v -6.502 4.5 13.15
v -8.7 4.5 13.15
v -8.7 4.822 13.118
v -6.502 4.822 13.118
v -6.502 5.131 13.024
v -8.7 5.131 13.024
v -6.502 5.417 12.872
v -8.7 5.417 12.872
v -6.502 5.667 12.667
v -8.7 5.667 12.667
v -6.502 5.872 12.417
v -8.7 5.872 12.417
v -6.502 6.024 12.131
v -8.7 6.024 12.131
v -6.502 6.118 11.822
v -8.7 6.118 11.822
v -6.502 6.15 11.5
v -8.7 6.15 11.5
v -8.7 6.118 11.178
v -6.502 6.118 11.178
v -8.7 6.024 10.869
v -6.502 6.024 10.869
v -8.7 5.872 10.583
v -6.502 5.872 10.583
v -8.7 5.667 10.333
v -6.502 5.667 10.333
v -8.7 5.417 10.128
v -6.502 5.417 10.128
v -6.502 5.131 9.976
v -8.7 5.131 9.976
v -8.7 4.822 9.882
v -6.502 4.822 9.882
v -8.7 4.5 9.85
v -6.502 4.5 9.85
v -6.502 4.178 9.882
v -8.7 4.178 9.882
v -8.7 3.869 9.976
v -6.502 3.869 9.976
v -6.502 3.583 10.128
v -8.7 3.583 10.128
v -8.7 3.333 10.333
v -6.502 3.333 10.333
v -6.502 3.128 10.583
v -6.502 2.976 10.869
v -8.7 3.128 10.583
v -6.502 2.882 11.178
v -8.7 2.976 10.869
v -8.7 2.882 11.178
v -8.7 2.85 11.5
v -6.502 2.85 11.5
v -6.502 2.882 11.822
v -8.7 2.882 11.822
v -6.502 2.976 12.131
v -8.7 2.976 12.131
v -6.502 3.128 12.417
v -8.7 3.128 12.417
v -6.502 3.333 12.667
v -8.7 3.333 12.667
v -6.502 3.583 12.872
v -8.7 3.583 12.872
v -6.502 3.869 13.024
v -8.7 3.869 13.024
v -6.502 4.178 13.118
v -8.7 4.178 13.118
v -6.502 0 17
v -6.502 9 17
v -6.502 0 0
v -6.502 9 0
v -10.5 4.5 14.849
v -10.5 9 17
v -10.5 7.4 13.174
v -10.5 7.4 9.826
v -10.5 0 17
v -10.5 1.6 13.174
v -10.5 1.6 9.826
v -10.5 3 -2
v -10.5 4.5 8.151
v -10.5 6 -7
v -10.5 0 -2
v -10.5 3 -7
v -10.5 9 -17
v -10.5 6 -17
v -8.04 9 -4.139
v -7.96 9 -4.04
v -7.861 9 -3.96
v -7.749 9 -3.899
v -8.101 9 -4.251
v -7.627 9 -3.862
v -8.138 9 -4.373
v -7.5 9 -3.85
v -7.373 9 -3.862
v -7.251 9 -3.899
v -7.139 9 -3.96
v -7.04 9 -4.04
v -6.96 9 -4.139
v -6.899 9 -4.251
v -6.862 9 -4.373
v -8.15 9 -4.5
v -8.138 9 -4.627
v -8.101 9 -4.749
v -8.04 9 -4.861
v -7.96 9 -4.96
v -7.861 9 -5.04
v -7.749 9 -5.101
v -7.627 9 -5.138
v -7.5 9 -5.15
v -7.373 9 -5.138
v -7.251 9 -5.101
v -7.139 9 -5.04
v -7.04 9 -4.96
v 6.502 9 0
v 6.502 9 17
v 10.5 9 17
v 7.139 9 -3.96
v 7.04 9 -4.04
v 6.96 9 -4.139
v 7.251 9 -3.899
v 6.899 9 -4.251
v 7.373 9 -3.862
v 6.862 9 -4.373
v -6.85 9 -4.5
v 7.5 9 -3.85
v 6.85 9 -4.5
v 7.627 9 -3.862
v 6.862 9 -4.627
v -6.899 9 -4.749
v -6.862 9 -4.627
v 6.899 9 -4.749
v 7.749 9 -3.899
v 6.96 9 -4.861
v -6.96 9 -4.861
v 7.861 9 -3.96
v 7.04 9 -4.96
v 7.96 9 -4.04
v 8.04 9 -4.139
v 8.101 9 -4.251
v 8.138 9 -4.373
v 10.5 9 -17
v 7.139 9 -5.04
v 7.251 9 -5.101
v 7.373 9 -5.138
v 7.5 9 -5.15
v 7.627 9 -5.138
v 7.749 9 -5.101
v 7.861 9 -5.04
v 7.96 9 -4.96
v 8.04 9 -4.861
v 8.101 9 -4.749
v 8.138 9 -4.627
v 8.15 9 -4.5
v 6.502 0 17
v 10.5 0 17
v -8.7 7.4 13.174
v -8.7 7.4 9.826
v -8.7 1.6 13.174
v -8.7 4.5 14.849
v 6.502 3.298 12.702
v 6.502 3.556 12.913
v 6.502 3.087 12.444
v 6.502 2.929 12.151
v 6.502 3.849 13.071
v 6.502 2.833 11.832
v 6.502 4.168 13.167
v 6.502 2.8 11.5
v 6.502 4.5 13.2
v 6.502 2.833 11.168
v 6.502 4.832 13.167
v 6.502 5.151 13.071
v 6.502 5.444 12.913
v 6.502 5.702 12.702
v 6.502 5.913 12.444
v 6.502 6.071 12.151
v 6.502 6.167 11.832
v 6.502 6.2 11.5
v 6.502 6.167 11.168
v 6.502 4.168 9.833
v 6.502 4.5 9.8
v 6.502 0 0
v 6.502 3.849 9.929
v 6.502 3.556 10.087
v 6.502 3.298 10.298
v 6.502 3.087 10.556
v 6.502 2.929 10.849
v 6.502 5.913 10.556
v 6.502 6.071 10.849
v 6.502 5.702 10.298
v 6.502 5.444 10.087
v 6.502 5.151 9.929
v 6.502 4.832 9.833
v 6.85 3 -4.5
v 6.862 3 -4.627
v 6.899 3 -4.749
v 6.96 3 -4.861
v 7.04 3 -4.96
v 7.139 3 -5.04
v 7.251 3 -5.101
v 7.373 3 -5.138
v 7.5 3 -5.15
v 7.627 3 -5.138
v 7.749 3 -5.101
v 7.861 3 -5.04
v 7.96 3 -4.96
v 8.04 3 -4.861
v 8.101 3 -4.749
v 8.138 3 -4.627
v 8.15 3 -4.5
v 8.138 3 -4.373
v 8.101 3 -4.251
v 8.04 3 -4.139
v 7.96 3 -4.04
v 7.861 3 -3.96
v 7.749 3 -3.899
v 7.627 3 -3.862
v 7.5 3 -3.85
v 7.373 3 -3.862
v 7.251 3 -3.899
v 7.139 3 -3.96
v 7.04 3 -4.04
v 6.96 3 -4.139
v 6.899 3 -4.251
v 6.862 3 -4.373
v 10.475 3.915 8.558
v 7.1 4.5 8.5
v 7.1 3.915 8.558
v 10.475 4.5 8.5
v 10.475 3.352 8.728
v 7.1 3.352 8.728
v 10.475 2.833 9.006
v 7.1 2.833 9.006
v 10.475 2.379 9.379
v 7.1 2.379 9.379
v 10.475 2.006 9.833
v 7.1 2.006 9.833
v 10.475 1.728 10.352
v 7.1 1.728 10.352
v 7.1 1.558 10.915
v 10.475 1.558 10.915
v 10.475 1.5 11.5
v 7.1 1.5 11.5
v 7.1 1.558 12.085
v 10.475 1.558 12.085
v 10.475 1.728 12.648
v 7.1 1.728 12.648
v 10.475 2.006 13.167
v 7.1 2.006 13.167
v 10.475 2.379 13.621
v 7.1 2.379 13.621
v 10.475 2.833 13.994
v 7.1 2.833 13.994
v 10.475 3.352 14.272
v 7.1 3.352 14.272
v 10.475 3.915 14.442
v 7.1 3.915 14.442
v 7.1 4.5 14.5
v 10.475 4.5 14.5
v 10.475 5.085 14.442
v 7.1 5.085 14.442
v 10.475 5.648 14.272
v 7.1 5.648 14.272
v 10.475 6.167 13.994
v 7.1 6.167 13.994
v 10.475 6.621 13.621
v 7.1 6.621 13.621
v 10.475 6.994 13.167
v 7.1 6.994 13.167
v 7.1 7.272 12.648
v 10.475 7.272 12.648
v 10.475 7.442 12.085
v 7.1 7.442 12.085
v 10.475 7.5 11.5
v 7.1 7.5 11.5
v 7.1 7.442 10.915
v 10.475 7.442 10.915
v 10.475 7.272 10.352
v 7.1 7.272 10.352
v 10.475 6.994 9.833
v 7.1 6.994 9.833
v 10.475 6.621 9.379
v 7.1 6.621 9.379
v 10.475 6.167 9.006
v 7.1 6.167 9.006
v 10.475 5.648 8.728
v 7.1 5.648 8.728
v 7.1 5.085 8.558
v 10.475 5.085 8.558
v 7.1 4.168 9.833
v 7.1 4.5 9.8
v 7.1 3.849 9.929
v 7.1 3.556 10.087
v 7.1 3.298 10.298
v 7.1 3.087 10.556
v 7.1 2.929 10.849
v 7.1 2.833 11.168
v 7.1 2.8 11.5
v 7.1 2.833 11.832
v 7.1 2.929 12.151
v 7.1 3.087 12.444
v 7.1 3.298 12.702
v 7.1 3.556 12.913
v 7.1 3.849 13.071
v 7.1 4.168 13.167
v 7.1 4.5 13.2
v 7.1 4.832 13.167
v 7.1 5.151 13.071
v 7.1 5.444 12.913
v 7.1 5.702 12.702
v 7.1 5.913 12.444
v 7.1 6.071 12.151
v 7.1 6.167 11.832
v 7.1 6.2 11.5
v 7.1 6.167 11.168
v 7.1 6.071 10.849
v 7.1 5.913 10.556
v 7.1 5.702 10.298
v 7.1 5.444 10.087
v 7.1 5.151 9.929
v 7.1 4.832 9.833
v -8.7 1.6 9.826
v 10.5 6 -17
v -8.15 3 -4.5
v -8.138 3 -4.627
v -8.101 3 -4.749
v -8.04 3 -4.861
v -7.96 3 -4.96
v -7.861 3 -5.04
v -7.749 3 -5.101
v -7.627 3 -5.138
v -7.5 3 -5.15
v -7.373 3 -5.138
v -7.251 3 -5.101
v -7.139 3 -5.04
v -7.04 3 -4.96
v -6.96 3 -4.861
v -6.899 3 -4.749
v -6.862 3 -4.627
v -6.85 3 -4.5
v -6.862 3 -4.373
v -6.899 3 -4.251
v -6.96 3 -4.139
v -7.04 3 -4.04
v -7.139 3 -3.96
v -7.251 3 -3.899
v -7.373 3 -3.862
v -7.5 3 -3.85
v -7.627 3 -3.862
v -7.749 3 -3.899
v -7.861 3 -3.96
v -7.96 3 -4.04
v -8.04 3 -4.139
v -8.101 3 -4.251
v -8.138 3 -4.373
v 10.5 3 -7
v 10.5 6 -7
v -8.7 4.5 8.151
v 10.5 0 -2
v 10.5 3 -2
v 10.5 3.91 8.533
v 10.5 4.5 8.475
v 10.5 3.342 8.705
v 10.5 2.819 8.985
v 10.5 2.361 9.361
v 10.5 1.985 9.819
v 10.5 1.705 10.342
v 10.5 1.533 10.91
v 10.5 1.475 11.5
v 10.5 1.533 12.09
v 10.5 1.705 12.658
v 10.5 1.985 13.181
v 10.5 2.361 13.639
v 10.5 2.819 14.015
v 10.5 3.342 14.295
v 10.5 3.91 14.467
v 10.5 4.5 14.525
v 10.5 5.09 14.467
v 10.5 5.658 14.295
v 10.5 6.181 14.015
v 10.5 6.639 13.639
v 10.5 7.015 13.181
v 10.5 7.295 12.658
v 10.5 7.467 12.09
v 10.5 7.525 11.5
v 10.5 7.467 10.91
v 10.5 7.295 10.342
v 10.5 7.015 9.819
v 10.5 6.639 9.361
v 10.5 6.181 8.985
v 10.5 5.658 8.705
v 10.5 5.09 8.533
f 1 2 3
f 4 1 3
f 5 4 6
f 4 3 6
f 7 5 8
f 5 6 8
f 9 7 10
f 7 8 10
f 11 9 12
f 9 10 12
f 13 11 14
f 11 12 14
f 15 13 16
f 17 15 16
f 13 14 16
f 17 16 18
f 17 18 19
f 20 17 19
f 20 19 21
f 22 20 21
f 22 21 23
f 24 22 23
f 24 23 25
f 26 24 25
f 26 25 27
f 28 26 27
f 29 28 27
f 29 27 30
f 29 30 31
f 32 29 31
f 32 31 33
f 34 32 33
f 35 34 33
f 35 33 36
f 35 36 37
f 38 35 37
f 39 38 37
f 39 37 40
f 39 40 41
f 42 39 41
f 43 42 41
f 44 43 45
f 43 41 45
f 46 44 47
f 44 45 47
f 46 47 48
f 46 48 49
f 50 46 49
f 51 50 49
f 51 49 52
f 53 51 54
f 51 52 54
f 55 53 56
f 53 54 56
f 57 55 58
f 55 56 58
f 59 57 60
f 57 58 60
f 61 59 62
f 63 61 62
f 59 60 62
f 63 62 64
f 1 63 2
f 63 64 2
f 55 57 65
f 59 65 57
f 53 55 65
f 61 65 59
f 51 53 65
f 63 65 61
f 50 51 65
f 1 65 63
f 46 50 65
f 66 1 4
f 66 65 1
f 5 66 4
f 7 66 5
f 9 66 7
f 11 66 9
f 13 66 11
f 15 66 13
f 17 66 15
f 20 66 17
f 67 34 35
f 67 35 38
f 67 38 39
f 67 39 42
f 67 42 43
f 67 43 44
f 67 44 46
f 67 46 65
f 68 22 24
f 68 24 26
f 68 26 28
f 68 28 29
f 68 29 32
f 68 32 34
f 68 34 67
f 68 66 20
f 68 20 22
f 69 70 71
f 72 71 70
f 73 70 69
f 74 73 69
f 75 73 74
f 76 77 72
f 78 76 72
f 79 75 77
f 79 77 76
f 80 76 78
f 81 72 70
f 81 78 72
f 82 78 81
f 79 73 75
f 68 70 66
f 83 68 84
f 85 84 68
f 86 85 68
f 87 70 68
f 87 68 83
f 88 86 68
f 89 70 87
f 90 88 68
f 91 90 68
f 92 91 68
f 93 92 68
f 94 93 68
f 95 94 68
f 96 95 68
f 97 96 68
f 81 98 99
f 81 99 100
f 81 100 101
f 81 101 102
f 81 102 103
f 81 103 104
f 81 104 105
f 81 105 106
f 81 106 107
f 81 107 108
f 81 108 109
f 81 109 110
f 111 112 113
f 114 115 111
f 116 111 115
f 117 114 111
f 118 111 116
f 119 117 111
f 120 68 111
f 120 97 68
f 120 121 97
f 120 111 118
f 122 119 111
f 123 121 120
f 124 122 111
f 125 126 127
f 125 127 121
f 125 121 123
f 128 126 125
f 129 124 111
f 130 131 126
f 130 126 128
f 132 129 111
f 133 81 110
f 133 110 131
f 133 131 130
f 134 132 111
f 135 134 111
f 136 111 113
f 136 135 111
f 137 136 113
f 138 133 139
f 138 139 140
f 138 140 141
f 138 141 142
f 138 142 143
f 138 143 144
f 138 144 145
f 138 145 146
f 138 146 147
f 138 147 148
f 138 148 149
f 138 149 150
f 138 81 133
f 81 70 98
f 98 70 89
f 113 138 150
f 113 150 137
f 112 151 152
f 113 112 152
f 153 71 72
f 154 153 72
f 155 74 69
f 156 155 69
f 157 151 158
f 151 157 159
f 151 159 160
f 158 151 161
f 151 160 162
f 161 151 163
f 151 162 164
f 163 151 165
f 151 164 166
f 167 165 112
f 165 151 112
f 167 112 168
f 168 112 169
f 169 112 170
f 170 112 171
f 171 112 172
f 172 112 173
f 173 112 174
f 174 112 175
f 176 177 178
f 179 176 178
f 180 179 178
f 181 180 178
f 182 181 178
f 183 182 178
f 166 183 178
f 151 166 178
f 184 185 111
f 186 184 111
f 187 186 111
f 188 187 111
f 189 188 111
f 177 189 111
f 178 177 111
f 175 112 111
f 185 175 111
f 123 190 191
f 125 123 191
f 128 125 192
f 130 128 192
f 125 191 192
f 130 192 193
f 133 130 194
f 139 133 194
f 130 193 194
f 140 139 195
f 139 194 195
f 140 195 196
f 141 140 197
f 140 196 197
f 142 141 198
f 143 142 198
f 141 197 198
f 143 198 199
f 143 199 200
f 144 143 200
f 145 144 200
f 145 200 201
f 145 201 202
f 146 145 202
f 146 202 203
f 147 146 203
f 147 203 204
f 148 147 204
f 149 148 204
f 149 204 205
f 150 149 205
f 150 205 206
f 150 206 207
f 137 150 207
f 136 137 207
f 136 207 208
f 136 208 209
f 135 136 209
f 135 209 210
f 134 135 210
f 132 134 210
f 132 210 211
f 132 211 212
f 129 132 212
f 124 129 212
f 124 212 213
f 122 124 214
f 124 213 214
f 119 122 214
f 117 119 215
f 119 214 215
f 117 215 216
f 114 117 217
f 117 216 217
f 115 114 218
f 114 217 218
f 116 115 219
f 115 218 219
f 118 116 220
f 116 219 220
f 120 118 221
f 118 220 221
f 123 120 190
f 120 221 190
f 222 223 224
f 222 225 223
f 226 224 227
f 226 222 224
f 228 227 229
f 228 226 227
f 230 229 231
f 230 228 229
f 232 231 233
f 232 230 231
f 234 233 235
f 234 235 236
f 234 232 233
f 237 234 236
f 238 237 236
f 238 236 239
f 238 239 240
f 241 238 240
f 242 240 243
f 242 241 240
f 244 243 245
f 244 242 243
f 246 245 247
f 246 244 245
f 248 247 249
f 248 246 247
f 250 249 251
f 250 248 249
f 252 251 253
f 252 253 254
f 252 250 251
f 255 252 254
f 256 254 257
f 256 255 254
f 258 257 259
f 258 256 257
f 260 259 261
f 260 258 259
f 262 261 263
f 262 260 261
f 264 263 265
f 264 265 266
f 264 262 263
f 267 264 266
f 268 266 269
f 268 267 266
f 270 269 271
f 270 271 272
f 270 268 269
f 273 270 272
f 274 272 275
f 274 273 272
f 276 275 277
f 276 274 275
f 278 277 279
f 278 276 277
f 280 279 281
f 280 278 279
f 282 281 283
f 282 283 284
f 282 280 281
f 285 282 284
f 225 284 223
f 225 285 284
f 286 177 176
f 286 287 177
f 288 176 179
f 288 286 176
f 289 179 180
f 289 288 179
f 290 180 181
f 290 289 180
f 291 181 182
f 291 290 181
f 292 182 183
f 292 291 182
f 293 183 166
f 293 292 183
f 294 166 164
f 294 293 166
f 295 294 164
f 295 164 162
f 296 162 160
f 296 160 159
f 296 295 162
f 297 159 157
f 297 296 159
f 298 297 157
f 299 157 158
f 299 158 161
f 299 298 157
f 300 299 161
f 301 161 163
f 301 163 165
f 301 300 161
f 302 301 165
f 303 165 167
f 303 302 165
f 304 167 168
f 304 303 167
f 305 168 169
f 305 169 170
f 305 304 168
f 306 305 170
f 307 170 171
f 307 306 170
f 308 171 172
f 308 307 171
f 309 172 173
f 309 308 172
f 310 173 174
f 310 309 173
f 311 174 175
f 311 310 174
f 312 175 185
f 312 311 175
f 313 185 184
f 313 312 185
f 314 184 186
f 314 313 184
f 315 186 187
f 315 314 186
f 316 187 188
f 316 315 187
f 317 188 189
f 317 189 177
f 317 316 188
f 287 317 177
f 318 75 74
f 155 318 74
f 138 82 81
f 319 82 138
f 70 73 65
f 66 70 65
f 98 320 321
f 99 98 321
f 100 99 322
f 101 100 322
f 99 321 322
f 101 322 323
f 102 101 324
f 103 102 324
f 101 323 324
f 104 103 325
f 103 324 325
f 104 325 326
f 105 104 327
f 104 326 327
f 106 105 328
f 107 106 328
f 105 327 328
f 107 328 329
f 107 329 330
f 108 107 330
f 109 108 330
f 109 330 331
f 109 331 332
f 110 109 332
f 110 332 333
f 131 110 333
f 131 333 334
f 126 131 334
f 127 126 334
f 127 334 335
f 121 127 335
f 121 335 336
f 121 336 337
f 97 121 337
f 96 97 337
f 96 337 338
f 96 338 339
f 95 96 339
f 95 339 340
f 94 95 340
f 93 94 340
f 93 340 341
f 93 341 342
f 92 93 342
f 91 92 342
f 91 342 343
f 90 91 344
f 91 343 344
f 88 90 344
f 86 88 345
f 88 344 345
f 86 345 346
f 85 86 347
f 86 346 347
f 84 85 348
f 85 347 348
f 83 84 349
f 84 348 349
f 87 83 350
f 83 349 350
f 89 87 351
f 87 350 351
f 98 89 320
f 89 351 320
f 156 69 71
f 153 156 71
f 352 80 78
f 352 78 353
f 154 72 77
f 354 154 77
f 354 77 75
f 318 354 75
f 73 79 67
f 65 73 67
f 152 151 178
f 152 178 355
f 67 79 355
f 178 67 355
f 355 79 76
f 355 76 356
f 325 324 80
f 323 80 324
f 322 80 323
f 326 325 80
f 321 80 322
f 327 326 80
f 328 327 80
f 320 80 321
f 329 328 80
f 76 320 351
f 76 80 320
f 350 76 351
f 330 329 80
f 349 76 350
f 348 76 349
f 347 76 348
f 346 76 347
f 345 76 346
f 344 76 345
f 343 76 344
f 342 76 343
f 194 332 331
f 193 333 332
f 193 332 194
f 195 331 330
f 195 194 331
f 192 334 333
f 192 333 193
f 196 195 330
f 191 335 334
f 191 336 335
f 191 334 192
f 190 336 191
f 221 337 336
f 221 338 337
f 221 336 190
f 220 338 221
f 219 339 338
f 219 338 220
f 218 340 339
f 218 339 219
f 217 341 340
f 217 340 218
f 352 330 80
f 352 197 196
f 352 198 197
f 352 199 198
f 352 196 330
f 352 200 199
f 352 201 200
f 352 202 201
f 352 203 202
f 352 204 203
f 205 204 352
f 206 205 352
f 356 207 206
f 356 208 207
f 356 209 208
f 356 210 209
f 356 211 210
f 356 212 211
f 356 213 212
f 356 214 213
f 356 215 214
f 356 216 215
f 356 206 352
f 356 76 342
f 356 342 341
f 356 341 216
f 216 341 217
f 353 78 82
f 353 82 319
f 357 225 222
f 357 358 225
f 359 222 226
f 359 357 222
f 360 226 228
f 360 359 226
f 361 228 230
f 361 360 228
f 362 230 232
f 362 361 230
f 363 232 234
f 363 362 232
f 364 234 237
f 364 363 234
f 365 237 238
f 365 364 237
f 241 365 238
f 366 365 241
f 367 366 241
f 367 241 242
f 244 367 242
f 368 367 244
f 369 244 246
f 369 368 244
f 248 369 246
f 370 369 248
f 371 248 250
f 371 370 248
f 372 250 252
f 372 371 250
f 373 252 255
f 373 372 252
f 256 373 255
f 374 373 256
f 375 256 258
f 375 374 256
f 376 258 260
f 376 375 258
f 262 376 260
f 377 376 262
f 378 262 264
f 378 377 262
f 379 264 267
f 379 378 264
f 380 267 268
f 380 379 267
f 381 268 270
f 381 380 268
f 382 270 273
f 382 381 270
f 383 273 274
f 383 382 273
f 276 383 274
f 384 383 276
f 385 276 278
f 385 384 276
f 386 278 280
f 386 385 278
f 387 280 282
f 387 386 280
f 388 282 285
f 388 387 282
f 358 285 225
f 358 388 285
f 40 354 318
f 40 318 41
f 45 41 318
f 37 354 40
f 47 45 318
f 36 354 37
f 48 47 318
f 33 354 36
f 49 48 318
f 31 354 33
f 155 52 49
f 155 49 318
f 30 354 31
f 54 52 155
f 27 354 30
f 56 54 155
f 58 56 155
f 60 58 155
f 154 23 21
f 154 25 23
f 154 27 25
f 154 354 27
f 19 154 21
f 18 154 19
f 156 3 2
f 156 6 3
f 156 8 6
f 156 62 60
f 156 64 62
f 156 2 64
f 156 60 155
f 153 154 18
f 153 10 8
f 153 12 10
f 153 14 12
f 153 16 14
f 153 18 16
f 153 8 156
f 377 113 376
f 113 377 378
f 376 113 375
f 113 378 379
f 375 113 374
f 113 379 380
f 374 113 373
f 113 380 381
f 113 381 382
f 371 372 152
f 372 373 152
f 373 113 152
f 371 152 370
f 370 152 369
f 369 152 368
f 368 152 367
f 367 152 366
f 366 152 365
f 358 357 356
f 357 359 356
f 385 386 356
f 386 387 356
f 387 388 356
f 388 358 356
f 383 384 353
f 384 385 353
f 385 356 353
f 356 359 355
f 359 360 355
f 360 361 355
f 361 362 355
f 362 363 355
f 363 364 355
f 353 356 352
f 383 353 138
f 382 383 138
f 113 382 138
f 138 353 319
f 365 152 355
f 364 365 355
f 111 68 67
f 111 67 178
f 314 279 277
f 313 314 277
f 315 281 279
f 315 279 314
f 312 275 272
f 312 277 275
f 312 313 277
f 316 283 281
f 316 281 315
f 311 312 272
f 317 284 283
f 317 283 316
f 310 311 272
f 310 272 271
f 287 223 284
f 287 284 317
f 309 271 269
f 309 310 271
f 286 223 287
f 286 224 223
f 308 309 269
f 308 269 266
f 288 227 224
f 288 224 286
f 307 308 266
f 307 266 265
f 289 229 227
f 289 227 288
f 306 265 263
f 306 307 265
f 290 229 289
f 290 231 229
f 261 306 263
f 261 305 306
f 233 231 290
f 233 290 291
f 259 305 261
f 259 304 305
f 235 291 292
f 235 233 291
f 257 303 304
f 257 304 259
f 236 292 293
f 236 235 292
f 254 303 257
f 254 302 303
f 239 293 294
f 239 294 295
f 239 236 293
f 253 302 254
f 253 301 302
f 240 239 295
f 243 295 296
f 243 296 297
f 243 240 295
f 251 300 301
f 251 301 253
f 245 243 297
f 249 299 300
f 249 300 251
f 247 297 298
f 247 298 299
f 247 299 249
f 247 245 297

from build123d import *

# Parameters (mm, degrees)
SKETCH_1_W          = 21
SKETCH_1_H          = 34
EXTRUDE_1_DEPTH     = 9
SKETCH_4_W          = 21
SKETCH_4_H          = 10
CUT_EXTRUDE_1_DEPTH = 6
SKETCH_5_W          = 21
SKETCH_5_H          = 15
CUT_EXTRUDE_2_DEPTH = 3
SKETCH_6_W          = 13.003696042
SKETCH_6_H          = 17
CUT_EXTRUDE_3_DEPTH = 22.914607001
CUT_EXTRUDE_4_DEPTH = 1.8
CUT_EXTRUDE_5_REACH = 29.178
SKETCH_11_R         = 1.65
HOLE_WIZARD_1_D     = 1.3


with BuildPart() as part:
    # 草图1 → 凸台-拉伸1 (new body)
    with BuildSketch(Plane(origin=(0, 0, 0), x_dir=(1, 0, 0), z_dir=(0, 1, 0))):
        Rectangle(SKETCH_1_W, SKETCH_1_H)
    extrude(amount=EXTRUDE_1_DEPTH)

    # 草图4 → 切除-拉伸1 (cut)
    with BuildSketch(Plane.XZ):
        with Locations((0, -12)):
            Rectangle(SKETCH_4_W, SKETCH_4_H)
    extrude(amount=-CUT_EXTRUDE_1_DEPTH, mode=Mode.SUBTRACT)

    # 草图5 → 切除-拉伸2 (cut)
    with BuildSketch(Plane.XZ):
        with Locations((0, -9.5)):
            Rectangle(SKETCH_5_W, SKETCH_5_H)
    extrude(amount=-CUT_EXTRUDE_2_DEPTH, mode=Mode.SUBTRACT)

    # 草图6 → 切除-拉伸3 (cut, through all)
    with BuildSketch(Plane(origin=(0, 9, 0), x_dir=(1, 0, 0), z_dir=(0, 1, 0))):
        with Locations((0, -8.5)):
            Rectangle(SKETCH_6_W, SKETCH_6_H)
    extrude(amount=-CUT_EXTRUDE_3_DEPTH, mode=Mode.SUBTRACT)

    # 草图9 → M3 六角圆柱头螺钉的柱形沉头孔1 (revolve, cut)
    with BuildSketch(Plane(origin=(10.5, 4.5, 11.5), x_dir=(0, 0, -1), z_dir=(0, 1, 0))):
        Polygon((0, 0), (0, 3.998151979), (1.7, 3.998151979), (1.7, 3.4), (3, 3.4), (3, 0.025), (3.025, 0), align=None)
    revolve(axis=Axis((16.85, 4.5, 11.5), (-1, 0, 0)), mode=Mode.SUBTRACT)

    # 草图10 → 切除-拉伸4 (cut)
    with BuildSketch(Plane.ZY.offset(10.5)):
        Polygon((13.174315781, 1.6), (14.848631561, 4.5), (13.174315781, 7.4), (9.825684219, 7.4), (8.151368439, 4.5), (9.825684219, 1.6), align=None)
    extrude(amount=-CUT_EXTRUDE_4_DEPTH, mode=Mode.SUBTRACT)

    # 草图11 → 切除-拉伸5 (cut, up to next)
    with BuildSketch(Plane.ZY.offset(8.7), mode=Mode.PRIVATE) as cut_extrude_5_sk1:
        with Locations((11.5, 4.5)):
            Circle(SKETCH_11_R)
    cut_extrude_5_tool1 = extrude(cut_extrude_5_sk1.sketch, amount=-CUT_EXTRUDE_5_REACH, mode=Mode.PRIVATE) & part.part
    add(cut_extrude_5_tool1.solids().sort_by_distance((-8.7, 4.5, 11.5))[0], mode=Mode.SUBTRACT)

    # 孔1 (through all)
    with Locations(Plane(origin=(0, 9, 0), x_dir=(1, 0, 0), z_dir=(0, 1, 0))):
        with Locations((-7.5, 4.5), (7.5, 4.5)):
            Hole(HOLE_WIZARD_1_D / 2)


solid = part.part
